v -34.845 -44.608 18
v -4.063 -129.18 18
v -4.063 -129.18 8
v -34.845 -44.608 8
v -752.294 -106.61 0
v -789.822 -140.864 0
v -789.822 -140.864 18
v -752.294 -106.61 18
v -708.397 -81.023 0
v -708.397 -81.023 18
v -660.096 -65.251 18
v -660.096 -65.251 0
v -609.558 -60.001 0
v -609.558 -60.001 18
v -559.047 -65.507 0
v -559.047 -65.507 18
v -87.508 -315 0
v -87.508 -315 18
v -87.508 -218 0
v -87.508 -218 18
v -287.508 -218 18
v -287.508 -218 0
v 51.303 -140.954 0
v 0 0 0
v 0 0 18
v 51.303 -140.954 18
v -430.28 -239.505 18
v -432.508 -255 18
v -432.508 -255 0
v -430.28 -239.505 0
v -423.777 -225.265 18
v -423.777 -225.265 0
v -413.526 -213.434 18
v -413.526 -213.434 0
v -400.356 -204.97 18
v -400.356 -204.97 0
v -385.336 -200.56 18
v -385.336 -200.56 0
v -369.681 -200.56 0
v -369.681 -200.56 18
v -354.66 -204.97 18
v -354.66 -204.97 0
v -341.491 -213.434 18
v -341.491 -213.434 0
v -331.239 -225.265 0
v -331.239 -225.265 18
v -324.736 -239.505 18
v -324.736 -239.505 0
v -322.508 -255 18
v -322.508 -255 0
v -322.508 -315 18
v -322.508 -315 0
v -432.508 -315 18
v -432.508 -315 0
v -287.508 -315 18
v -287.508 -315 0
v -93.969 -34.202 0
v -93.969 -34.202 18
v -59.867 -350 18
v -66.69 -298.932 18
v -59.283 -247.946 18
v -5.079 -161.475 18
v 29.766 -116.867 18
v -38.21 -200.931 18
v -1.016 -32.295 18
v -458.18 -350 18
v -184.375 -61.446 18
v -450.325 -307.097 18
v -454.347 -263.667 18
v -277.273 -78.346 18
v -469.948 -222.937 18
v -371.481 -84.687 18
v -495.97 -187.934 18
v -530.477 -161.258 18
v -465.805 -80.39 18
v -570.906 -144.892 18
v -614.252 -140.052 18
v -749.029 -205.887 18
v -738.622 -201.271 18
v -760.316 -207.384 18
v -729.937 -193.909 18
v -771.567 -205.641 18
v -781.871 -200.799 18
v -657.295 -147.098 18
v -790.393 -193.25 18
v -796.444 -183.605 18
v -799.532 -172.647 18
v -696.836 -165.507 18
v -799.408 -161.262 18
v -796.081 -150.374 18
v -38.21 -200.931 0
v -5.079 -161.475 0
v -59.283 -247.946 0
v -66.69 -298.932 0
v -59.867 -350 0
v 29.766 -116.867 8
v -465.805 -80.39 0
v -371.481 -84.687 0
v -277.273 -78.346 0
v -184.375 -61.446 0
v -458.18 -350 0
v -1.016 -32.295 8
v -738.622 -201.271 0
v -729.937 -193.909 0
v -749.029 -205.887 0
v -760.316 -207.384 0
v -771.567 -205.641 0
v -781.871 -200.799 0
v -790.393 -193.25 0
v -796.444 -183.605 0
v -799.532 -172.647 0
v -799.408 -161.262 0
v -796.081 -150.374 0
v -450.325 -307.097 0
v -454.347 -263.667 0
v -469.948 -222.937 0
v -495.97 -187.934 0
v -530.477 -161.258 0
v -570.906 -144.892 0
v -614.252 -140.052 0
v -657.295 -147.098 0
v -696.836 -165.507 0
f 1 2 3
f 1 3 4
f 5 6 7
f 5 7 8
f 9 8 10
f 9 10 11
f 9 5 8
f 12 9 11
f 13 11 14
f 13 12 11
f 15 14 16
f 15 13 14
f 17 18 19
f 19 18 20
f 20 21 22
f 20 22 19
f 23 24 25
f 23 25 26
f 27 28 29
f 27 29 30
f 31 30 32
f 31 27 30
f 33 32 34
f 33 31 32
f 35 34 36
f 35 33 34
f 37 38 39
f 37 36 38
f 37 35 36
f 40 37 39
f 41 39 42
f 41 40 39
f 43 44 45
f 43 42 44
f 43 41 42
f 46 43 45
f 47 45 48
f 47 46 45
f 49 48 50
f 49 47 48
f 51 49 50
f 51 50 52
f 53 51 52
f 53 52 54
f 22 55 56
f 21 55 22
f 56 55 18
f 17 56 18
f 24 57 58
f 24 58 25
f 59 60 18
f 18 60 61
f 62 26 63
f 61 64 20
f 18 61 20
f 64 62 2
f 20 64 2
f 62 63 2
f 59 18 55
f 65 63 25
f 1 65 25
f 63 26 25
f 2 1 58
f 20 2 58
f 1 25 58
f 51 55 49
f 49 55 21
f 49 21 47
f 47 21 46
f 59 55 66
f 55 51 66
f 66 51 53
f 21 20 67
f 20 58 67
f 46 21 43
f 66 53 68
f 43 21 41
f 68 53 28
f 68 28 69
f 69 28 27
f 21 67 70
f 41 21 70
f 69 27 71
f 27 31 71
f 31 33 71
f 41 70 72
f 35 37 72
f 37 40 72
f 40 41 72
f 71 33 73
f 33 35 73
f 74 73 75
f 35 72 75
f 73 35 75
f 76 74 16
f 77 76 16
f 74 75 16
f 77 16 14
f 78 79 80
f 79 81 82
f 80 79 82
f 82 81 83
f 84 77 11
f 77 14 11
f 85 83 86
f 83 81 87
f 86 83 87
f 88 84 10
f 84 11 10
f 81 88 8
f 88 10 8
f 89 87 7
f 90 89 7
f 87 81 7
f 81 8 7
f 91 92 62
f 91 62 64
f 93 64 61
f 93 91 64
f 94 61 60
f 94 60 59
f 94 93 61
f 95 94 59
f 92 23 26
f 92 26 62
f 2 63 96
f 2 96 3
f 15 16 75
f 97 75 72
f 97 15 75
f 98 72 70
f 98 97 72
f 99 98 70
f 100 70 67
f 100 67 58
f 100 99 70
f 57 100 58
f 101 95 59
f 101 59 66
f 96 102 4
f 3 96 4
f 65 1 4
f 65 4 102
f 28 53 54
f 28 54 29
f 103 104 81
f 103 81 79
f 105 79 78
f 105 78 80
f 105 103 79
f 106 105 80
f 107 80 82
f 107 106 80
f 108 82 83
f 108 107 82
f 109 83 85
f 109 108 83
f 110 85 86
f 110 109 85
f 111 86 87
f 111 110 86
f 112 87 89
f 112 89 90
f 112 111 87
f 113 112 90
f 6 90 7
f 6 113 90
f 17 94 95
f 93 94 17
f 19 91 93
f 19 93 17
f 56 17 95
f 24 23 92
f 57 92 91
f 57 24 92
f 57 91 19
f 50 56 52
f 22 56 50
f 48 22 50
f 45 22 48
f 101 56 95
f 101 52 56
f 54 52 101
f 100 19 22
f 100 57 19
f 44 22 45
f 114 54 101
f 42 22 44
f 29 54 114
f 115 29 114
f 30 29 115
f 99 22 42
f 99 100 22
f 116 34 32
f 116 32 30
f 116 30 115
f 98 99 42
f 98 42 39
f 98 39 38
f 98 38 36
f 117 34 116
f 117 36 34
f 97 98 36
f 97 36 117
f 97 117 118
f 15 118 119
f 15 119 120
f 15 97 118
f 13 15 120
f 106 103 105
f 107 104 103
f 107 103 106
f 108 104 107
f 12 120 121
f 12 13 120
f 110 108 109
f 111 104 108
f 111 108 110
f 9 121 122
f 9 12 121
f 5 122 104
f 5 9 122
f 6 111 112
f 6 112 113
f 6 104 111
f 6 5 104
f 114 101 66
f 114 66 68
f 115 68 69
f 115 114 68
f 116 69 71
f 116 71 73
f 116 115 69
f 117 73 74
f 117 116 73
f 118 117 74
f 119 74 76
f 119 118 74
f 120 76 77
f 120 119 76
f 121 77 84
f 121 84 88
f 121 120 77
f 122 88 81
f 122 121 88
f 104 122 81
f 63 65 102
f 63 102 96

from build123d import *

# Parameters (mm, degrees)
BOSS_EXTRUDE1_DEPTH = 18
SKETCH2_W           = 200
SKETCH2_H           = 97
CUT_EXTRUDE1_DEPTH  = 19
CUT_EXTRUDE2_DEPTH  = 10


with BuildPart() as part:
    # Sketch1 → Boss-Extrude1 (new body)
    with BuildSketch(Plane.XY):
        with BuildLine():
            Line((0, 0), (51.303021499, -140.953893118))
            Line((51.303021499, -140.953893118), (-5.078535748, -161.475101717))
            ThreePointArc((-5.078535748, -161.475101717), (-59.282744504, -247.94612641), (-59.866905015, -350))
            Line((-59.866905015, -350), (-458.18031046, -350))
            ThreePointArc((-458.18031046, -350), (-530.476755656, -161.257646224), (-729.936822659, -193.909350133))
            ThreePointArc((-729.936822659, -193.909350133), (-786.401902791, -197.329105332), (-789.82165799, -140.864025199))
            ThreePointArc((-789.82165799, -140.864025199), (-684.665051265, -71.855170989), (-559.047216388, -65.507458149))
            ThreePointArc((-559.047216388, -65.507458149), (-324.287619955, -82.844559906), (-93.969262079, -34.202014333))
            Line((-93.969262079, -34.202014333), (0, 0))
        make_face()
    extrude(amount=BOSS_EXTRUDE1_DEPTH)

    # Sketch2 → Cut-Extrude1 (cut, through all)
    with BuildSketch(Plane.XY.offset(18)):
        with Locations((-187.508312236, -266.5)):
            Rectangle(SKETCH2_W, SKETCH2_H)
        with BuildLine():
            Line((-322.508312236, -315), (-432.508312236, -315))
            Line((-432.508312236, -315), (-432.508312236, -255))
            ThreePointArc((-432.508312236, -255), (-377.508312236, -200), (-322.508312236, -255))
            Line((-322.508312236, -255), (-322.508312236, -315))
        make_face()
    extrude(amount=-CUT_EXTRUDE1_DEPTH, mode=Mode.SUBTRACT)

    # Sketch3 → Cut-Extrude2 (cut)
    with BuildSketch(Plane.XY.offset(18)):
        Polygon((-1.01570715, -32.295020343), (29.76610575, -116.867356214), (-4.062828599, -129.180081374), (-34.844641498, -44.607745503), align=None)
    extrude(amount=-CUT_EXTRUDE2_DEPTH, mode=Mode.SUBTRACT)


solid = part.part
